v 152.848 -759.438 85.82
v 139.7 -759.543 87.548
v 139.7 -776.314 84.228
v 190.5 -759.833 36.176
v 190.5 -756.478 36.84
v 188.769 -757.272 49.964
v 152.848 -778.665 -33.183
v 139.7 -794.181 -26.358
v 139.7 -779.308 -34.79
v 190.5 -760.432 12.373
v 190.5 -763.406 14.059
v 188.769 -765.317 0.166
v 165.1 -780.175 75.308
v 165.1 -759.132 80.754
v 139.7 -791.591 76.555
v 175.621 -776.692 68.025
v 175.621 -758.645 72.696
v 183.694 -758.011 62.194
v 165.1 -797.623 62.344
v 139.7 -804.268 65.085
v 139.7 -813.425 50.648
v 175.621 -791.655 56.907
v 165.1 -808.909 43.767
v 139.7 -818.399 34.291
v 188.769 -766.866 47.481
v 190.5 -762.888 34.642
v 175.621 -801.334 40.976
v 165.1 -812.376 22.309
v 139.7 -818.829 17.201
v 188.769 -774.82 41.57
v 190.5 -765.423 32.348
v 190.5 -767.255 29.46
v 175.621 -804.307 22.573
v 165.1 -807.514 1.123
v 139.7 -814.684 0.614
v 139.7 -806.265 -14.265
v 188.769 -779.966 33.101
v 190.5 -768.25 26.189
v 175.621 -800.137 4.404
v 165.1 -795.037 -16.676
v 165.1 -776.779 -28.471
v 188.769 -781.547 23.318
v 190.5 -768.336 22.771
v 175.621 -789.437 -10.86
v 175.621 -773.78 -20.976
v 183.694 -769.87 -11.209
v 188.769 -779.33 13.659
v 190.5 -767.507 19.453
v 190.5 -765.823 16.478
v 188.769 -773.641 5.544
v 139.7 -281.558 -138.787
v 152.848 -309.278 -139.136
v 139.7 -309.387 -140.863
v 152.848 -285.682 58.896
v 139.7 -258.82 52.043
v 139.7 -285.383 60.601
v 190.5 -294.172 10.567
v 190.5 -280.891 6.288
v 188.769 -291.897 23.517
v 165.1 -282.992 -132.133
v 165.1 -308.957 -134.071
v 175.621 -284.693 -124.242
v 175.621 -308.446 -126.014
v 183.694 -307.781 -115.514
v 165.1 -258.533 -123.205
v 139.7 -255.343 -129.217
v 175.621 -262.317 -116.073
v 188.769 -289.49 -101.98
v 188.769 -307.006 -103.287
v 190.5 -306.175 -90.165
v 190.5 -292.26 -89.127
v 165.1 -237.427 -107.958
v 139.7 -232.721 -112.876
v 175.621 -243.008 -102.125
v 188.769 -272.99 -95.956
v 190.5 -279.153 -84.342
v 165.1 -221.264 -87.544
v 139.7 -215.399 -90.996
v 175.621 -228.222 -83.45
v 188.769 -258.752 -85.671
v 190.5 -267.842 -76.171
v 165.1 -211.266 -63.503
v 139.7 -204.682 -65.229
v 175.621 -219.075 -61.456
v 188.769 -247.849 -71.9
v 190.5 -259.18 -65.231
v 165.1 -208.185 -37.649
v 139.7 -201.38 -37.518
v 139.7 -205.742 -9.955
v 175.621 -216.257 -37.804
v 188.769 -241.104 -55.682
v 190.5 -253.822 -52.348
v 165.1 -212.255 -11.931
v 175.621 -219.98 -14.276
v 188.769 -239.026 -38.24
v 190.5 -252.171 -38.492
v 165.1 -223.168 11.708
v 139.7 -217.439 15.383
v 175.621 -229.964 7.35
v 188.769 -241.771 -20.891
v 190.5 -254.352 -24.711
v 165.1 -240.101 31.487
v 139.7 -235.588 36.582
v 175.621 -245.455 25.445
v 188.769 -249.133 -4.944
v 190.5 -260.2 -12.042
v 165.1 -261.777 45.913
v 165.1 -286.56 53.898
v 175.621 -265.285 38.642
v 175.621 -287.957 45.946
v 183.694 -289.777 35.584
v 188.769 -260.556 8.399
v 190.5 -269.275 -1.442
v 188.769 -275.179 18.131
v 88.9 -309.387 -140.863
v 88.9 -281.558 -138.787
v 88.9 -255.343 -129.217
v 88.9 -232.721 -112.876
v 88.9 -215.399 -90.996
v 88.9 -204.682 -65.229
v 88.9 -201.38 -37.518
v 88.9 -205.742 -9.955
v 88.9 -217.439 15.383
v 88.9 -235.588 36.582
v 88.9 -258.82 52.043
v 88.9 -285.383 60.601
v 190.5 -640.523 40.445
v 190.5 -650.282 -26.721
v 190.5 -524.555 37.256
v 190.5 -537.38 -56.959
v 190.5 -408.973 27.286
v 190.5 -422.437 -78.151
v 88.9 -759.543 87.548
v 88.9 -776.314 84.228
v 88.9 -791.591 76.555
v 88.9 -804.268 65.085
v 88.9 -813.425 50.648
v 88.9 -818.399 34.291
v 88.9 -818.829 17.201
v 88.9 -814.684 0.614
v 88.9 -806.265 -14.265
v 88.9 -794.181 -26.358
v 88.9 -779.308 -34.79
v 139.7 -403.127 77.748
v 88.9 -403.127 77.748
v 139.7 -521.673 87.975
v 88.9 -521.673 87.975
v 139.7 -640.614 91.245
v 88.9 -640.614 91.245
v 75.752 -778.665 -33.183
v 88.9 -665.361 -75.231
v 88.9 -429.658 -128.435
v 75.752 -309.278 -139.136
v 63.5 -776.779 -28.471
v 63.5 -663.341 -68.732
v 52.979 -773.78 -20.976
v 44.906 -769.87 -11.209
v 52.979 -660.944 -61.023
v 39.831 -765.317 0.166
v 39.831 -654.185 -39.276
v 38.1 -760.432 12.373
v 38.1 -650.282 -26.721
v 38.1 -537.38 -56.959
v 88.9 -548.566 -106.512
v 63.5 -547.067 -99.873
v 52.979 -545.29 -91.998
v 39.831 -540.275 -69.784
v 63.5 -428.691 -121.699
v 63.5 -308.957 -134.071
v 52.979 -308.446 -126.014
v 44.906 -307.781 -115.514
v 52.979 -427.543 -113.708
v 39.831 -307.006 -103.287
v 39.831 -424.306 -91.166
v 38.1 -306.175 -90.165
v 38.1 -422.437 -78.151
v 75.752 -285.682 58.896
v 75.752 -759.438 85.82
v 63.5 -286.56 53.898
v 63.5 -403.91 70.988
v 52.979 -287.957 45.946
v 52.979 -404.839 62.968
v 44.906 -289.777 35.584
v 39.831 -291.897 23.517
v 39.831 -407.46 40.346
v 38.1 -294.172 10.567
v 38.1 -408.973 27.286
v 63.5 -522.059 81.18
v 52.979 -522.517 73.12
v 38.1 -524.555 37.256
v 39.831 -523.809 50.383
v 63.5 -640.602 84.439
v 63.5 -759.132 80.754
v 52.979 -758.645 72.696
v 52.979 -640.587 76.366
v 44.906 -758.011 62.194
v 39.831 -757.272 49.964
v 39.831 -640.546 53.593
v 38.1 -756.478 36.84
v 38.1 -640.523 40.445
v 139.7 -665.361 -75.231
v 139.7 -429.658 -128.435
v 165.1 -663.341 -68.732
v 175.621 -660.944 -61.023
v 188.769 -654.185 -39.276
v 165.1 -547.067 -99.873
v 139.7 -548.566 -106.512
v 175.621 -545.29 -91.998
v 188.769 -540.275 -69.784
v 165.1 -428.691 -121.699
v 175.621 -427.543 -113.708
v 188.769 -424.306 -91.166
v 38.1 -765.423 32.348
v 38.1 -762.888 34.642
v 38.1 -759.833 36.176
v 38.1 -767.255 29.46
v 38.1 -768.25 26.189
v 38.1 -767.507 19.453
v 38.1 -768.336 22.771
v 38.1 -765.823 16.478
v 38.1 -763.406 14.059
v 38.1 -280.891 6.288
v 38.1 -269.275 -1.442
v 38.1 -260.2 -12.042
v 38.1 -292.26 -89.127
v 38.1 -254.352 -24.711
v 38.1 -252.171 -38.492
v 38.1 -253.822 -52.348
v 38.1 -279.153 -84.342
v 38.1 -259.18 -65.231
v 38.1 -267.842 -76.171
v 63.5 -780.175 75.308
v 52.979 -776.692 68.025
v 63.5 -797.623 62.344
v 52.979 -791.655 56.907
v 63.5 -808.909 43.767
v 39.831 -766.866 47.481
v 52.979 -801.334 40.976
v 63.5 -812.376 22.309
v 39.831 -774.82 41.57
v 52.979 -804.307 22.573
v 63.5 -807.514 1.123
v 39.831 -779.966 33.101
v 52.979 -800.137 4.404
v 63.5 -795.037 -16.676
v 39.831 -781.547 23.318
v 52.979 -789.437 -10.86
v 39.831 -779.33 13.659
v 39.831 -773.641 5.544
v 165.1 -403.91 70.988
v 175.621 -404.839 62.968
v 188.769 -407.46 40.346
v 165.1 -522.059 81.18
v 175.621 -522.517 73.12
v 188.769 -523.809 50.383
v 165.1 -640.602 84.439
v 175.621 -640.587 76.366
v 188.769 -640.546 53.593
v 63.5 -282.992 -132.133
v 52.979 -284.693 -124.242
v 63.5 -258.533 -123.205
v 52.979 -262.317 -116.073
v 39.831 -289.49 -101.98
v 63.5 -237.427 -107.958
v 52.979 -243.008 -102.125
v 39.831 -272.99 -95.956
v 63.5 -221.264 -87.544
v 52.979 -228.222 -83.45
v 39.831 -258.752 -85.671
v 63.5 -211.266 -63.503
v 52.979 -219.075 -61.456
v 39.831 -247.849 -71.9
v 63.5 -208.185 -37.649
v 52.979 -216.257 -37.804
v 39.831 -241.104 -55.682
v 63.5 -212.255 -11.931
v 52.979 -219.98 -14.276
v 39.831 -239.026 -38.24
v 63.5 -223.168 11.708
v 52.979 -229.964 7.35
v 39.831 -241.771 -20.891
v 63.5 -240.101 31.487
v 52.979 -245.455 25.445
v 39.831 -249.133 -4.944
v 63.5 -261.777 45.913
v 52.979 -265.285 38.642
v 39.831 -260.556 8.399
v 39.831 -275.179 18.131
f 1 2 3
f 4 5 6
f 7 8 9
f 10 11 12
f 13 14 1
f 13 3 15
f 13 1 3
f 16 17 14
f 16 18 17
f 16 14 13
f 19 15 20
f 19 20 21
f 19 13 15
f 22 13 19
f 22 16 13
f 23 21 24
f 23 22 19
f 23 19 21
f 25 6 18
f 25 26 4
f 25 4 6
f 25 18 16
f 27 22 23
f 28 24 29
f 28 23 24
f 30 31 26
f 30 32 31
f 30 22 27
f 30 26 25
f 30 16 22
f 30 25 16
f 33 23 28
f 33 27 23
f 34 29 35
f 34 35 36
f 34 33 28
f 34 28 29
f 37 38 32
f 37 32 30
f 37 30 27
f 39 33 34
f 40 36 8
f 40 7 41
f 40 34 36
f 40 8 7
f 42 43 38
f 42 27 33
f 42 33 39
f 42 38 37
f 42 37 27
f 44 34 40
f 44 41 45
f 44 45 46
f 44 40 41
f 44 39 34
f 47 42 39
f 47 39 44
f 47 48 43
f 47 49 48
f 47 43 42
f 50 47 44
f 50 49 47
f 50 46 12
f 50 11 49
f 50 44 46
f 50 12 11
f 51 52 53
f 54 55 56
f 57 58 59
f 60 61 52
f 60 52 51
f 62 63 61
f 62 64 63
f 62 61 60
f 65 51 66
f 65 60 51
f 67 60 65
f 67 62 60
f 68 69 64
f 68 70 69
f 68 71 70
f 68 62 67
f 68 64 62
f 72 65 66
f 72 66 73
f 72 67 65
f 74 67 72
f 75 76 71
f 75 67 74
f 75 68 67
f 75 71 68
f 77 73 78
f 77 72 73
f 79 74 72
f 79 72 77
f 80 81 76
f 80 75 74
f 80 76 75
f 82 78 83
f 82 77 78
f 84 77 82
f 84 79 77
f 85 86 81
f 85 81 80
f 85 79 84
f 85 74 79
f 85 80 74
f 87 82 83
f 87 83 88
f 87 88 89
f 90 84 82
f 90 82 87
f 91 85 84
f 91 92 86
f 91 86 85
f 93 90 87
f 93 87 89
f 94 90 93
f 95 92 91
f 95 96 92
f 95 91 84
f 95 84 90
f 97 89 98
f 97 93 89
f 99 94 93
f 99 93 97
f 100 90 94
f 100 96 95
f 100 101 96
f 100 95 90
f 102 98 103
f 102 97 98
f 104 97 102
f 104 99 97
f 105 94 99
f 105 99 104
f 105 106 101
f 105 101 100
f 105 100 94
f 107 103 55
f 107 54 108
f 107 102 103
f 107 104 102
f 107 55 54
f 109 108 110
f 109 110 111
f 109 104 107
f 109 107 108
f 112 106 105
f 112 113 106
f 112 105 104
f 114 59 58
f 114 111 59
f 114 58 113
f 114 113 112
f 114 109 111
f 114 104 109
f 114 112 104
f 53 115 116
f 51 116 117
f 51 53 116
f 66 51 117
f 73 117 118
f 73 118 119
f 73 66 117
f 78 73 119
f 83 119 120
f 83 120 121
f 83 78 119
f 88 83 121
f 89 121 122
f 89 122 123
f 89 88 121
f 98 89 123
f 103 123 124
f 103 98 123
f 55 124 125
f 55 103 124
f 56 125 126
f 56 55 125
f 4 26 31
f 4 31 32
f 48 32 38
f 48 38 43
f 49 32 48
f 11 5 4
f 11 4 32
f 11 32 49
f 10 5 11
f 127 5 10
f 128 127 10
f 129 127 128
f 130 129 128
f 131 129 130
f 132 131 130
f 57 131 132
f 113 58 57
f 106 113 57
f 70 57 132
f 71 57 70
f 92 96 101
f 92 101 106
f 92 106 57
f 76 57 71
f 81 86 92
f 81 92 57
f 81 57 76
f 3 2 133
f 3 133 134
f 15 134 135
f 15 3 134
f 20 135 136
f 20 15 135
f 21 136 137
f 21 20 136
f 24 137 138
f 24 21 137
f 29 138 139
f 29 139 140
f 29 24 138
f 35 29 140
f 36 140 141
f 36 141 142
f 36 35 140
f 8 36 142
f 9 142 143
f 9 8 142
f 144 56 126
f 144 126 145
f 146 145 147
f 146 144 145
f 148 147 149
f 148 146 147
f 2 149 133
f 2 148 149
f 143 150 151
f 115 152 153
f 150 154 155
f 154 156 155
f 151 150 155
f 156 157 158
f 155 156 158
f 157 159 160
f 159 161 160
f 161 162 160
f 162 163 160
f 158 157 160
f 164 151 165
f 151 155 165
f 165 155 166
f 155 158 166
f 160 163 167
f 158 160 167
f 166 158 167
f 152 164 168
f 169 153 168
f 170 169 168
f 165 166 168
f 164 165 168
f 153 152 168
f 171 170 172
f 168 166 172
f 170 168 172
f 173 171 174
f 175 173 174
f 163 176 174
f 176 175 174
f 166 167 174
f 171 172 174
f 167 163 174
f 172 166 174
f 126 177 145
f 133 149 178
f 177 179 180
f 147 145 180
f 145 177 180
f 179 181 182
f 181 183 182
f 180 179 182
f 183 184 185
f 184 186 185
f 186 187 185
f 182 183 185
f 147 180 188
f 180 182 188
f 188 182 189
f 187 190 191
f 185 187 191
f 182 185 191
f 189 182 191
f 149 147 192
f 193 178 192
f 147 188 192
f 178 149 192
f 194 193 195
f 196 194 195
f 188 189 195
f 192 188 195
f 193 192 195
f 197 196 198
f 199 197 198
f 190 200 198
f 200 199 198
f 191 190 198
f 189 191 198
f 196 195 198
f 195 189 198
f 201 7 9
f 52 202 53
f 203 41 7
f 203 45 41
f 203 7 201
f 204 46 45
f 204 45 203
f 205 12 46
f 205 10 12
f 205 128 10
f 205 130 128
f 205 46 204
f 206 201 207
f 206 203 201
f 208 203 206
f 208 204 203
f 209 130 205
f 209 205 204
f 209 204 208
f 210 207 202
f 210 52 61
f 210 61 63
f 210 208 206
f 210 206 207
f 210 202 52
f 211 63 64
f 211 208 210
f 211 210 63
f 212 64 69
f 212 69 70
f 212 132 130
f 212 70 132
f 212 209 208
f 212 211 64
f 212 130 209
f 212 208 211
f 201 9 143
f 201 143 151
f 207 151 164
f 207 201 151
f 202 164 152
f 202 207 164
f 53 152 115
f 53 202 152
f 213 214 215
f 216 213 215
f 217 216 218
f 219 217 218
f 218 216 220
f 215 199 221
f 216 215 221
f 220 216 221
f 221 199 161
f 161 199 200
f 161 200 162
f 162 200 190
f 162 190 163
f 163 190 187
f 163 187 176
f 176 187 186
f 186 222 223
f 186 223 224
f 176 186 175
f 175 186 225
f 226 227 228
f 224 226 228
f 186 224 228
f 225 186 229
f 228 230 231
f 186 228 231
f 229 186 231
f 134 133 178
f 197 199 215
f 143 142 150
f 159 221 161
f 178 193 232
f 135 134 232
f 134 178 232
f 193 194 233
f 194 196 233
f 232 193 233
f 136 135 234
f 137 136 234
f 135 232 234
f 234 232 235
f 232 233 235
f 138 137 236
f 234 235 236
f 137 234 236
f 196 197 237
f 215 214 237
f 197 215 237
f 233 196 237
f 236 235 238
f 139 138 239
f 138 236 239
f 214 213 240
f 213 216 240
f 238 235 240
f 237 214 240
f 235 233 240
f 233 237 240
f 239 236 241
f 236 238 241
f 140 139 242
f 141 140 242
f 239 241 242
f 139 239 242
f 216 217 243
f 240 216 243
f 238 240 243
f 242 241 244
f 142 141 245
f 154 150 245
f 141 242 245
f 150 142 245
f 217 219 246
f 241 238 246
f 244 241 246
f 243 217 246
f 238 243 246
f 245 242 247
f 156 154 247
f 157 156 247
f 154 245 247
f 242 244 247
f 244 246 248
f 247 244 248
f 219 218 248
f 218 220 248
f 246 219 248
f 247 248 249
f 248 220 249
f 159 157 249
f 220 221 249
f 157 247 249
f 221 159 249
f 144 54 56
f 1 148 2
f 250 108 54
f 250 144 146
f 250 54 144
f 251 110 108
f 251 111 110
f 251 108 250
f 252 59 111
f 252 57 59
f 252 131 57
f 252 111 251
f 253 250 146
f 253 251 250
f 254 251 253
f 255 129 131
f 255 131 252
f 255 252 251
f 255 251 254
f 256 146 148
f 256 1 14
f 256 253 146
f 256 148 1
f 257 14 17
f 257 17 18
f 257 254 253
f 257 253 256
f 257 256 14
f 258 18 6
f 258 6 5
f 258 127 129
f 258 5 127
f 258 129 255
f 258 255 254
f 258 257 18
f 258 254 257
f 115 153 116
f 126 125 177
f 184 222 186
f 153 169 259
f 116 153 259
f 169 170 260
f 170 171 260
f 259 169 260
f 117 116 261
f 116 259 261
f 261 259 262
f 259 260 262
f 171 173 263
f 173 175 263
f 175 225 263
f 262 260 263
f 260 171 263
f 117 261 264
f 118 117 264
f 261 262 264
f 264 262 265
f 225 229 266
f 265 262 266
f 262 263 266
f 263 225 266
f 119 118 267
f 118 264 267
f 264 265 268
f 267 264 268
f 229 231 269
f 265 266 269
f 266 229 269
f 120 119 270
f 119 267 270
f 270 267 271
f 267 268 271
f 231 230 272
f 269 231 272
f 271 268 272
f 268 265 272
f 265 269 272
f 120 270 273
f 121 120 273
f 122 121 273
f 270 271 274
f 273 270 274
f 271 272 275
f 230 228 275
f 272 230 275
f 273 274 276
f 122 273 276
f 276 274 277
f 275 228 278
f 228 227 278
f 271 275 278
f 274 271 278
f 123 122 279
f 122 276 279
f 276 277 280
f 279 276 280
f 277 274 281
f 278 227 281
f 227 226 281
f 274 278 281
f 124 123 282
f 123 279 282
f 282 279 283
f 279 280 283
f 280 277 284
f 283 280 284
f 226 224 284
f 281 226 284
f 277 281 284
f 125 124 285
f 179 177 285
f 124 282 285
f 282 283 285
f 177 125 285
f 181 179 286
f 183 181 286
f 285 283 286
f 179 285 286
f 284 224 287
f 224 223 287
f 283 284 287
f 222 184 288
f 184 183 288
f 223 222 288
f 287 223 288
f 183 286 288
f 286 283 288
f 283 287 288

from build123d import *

# Parameters (mm, degrees)
BASE_EXTRUDE_DEPTH = 76.2
FILLET1_R          = 50.8


with BuildPart() as part:
    # Sketch6 → Base-Extrude (new, symmetric)
    with BuildSketch(Plane(origin=(114.3, 0, 0), x_dir=(0, 0, -1), z_dir=(1, 0, 0))):
        with BuildLine():
            ThreePointArc((140.863322284, -309.38746157), (51.487534639, -202.075387677), (-60.600919328, -285.382596895))
            ThreePointArc((-60.600919328, -285.382596895), (-87.974645435, -521.672761045), (-87.547578328, -759.542851996))
            ThreePointArc((-87.547578328, -759.542851996), (-34.291316824, -818.399413874), (34.789931143, -779.308424571))
            ThreePointArc((34.789931143, -779.308424571), (106.512103035, -548.56574137), (140.863322284, -309.38746157))
        make_face()
    extrude(amount=BASE_EXTRUDE_DEPTH, both=True)

    # Fillet1
    fillet1_edges = [part.edges().sort_by_distance(p)[0] for p in [
        (38.1, -818.399413874, 34.291316824),
        (190.5, -818.399413874, 34.291316824),
        (38.1, -521.672761045, 87.974645435),
        (190.5, -521.672761045, 87.974645435),
        (38.1, -202.075387677, -51.487534639),
        (190.5, -202.075387677, -51.487534639),
        (190.5, -548.56574137, -106.512103035),
        (38.1, -548.56574137, -106.512103035),
    ]]
    fillet(fillet1_edges, radius=FILLET1_R)


solid = part.part
